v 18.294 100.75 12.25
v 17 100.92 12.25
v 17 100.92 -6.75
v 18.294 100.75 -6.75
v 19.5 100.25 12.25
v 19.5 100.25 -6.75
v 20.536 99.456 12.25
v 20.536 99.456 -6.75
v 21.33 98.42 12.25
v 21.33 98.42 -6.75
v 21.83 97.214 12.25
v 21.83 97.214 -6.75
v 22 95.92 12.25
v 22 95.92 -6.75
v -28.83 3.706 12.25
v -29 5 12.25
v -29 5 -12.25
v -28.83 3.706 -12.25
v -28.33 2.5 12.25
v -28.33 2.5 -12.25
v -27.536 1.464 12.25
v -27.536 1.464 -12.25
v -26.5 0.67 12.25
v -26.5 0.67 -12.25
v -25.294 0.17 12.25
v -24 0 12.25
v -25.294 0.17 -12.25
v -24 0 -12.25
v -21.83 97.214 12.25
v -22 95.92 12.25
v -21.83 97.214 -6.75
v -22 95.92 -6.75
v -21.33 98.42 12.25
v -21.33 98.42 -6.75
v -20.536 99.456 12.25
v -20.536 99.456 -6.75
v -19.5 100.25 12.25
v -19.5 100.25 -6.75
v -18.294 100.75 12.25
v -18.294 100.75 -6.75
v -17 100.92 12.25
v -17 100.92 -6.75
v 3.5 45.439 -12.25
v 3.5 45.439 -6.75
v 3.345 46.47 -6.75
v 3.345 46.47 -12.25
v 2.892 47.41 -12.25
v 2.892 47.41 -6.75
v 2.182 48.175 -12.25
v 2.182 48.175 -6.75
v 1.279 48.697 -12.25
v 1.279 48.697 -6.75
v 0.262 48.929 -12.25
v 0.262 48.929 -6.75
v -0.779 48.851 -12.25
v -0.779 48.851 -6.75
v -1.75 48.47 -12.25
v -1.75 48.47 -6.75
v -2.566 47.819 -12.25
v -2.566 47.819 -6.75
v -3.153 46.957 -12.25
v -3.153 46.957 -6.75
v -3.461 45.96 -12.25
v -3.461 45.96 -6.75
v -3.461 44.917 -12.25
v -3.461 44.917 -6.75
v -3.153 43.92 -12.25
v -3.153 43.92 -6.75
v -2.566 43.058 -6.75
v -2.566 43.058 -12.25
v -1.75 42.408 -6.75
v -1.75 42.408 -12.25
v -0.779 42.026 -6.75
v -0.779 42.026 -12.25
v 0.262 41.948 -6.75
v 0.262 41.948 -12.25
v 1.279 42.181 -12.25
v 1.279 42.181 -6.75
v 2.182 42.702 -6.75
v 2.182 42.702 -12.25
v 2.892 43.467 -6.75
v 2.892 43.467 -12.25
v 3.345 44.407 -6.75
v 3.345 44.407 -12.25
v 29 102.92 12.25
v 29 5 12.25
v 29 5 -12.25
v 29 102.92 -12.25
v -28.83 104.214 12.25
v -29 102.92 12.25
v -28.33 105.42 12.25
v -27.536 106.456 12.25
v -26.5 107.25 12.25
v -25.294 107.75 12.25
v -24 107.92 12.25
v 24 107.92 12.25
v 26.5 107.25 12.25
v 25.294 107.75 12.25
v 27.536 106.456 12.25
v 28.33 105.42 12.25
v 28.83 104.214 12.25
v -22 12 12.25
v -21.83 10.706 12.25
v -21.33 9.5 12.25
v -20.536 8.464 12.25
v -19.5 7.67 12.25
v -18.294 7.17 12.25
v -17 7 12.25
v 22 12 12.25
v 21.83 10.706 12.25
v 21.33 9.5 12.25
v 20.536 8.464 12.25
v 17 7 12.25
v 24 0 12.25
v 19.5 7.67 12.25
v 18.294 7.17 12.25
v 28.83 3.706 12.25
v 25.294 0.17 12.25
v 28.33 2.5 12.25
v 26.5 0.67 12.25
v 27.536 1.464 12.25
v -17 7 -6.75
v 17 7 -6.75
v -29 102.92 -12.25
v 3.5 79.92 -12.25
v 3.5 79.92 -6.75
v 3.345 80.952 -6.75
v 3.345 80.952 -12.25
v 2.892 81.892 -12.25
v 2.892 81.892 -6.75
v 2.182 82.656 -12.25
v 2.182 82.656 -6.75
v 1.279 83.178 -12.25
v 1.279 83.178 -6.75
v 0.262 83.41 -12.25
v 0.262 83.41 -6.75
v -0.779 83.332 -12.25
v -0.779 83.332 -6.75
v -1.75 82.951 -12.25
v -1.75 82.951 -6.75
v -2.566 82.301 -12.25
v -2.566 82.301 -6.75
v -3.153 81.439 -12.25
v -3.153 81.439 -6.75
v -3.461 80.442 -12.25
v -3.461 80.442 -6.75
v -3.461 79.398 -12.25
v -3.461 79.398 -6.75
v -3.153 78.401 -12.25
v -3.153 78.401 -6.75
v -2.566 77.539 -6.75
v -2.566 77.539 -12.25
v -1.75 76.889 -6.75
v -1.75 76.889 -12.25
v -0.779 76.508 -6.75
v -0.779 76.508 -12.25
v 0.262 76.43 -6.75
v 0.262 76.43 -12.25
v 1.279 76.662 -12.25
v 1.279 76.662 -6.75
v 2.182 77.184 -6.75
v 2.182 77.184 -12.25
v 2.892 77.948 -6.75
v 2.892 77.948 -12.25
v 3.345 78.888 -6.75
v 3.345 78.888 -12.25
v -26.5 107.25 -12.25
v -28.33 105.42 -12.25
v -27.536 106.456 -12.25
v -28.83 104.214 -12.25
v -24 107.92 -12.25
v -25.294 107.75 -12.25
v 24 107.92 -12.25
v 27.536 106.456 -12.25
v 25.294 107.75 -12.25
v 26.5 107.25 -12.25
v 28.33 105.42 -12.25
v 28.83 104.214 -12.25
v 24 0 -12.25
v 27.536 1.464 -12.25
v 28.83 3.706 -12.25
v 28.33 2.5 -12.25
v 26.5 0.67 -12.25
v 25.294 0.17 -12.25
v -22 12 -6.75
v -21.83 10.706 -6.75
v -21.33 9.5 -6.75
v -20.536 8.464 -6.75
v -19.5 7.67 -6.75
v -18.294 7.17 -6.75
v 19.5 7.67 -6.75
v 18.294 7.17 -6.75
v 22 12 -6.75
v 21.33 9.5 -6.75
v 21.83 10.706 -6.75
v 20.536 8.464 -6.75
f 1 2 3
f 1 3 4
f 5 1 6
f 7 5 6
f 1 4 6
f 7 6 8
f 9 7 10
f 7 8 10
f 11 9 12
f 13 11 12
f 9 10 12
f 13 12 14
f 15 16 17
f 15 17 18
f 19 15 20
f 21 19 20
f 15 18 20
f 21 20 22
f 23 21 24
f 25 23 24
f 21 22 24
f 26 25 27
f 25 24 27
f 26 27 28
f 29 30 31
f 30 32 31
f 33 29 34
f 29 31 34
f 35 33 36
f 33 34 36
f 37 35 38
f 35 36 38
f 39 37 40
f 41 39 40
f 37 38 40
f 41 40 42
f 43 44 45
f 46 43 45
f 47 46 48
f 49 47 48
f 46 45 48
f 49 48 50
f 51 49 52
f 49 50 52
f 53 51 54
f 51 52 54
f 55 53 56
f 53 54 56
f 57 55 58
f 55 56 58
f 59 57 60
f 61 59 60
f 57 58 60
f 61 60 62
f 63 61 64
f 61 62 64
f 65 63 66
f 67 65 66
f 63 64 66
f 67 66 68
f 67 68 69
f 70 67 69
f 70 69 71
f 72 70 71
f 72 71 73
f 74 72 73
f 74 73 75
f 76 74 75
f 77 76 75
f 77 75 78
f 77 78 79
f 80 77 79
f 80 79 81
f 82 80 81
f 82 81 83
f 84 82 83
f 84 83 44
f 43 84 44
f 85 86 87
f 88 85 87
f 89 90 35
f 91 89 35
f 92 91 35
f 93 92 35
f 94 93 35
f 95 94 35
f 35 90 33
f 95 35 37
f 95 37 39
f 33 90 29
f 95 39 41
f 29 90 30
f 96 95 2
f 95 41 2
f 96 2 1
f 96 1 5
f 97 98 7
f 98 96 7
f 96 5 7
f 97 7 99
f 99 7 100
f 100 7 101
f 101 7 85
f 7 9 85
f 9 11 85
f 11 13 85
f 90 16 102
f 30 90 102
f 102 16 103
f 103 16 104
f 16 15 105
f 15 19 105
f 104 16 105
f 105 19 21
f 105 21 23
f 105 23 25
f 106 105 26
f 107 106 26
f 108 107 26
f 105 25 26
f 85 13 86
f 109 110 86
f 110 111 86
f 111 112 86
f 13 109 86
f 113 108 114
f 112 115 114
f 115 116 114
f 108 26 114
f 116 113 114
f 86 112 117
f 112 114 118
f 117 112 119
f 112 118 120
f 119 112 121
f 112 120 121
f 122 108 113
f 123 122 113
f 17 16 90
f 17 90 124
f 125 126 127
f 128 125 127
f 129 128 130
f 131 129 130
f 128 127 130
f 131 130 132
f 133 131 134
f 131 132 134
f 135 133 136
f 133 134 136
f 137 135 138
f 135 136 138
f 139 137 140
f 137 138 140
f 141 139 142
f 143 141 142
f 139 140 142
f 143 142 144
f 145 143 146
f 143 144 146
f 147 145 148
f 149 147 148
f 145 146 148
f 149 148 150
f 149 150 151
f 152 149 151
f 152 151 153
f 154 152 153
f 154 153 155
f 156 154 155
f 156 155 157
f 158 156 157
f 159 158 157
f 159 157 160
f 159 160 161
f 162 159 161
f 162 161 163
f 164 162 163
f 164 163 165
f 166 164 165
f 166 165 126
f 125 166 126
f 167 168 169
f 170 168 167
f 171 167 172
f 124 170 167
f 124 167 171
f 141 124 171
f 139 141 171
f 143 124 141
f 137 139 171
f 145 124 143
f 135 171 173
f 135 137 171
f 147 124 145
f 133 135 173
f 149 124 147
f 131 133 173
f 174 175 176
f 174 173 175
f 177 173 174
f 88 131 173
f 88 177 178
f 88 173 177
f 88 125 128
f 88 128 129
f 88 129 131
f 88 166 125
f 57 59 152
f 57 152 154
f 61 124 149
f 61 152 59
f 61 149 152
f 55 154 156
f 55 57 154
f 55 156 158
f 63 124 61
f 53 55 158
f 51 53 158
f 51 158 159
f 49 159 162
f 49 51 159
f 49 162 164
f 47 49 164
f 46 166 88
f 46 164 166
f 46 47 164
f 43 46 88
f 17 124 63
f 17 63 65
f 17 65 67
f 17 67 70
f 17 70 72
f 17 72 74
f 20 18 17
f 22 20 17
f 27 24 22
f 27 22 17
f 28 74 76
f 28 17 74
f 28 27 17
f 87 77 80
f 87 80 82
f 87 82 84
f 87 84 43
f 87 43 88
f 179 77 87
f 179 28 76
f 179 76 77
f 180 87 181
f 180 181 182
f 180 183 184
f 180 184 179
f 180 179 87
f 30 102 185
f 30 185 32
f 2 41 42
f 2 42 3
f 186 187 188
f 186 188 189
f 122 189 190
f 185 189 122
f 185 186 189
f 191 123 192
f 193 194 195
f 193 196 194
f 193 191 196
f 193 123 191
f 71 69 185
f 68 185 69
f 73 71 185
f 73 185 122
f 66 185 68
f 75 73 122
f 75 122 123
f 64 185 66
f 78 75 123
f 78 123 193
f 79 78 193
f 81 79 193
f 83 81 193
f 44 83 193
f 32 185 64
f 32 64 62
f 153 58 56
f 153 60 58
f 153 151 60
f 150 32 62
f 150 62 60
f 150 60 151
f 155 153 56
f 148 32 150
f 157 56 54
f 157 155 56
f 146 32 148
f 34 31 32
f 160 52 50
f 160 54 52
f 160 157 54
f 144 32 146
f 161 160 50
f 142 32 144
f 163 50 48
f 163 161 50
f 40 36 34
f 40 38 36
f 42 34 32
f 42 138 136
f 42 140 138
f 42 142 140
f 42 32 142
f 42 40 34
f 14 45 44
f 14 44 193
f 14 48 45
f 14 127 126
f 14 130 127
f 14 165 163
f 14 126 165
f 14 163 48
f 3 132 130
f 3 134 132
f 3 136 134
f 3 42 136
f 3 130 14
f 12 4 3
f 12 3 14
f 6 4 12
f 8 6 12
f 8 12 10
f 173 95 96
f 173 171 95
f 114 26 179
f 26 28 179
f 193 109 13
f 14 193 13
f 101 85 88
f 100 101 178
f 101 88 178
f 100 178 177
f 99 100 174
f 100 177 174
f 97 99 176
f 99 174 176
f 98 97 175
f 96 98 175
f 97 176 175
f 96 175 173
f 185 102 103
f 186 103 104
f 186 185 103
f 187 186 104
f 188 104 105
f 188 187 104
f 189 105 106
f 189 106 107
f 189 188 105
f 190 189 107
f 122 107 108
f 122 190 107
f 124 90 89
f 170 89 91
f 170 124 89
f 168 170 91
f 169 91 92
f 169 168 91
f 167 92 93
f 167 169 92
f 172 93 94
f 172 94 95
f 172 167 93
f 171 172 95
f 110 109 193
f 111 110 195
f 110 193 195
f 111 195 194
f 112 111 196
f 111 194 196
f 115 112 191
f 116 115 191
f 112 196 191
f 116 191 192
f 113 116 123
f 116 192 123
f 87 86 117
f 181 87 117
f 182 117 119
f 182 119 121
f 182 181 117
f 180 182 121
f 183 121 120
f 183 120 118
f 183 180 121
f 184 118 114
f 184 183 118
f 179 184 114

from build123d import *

# Parameters (mm, degrees)
ESBO_O1_W                  = 58
ESBO_O1_H                  = 24.5
RESSALTO_EXTRUS_O1_DEPTH   = 107.92
FILETE1_R                  = 5
ESBO_O2_W                  = 44
ESBO_O2_H                  = 93.92
CORTE_EXTRUS_O1_DEPTH      = 19
FILETE2_R                  = 5
ESBO_O3_R                  = 3.5
CORTE_EXTRUS_O2_DEPTH      = 20
CORTE_EXTRUS_O2_DEPTH_BACK = 6.5


with BuildPart() as part:
    # Esboço1 → Ressalto-extrusão1 (new body)
    with BuildSketch(Plane(origin=(0, 0, 0), x_dir=(1, 0, 0), z_dir=(0, 1, 0))):
        Rectangle(ESBO_O1_W, ESBO_O1_H)
    extrude(amount=RESSALTO_EXTRUS_O1_DEPTH)

    # Filete1
    filete1_edges = [part.edges().sort_by_distance(p)[0] for p in [
        (29, 107.92, 0),
        (-29, 107.92, 0),
        (29, 0, 0),
        (-29, 0, 0),
    ]]
    fillet(filete1_edges, radius=FILETE1_R)

    # Esboço2 → Corte-extrusão1 (cut)
    with BuildSketch(Plane.XY.offset(12.25)):
        with Locations((0, 53.96)):
            Rectangle(ESBO_O2_W, ESBO_O2_H)
    extrude(amount=-CORTE_EXTRUS_O1_DEPTH, mode=Mode.SUBTRACT)

    # Filete2
    filete2_edges = [part.edges().sort_by_distance(p)[0] for p in [
        (-22, 7, 2.75),
        (-22, 100.92, 2.75),
        (22, 100.92, 2.75),
        (22, 7, 2.75),
    ]]
    fillet(filete2_edges, radius=FILETE2_R)

    # Esboço3 → Corte-extrusão2 (cut, two sides)
    with BuildSketch(Plane.XY.offset(-6.75)) as corte_extrus_o2_sk:
        with Locations((0, 79.92)):
            Circle(ESBO_O3_R)
        with Locations((0, 45.4387)):
            Circle(ESBO_O3_R)
    extrude(amount=CORTE_EXTRUS_O2_DEPTH, mode=Mode.SUBTRACT)
    extrude(corte_extrus_o2_sk.sketch, amount=-CORTE_EXTRUS_O2_DEPTH_BACK, mode=Mode.SUBTRACT)


solid = part.part
